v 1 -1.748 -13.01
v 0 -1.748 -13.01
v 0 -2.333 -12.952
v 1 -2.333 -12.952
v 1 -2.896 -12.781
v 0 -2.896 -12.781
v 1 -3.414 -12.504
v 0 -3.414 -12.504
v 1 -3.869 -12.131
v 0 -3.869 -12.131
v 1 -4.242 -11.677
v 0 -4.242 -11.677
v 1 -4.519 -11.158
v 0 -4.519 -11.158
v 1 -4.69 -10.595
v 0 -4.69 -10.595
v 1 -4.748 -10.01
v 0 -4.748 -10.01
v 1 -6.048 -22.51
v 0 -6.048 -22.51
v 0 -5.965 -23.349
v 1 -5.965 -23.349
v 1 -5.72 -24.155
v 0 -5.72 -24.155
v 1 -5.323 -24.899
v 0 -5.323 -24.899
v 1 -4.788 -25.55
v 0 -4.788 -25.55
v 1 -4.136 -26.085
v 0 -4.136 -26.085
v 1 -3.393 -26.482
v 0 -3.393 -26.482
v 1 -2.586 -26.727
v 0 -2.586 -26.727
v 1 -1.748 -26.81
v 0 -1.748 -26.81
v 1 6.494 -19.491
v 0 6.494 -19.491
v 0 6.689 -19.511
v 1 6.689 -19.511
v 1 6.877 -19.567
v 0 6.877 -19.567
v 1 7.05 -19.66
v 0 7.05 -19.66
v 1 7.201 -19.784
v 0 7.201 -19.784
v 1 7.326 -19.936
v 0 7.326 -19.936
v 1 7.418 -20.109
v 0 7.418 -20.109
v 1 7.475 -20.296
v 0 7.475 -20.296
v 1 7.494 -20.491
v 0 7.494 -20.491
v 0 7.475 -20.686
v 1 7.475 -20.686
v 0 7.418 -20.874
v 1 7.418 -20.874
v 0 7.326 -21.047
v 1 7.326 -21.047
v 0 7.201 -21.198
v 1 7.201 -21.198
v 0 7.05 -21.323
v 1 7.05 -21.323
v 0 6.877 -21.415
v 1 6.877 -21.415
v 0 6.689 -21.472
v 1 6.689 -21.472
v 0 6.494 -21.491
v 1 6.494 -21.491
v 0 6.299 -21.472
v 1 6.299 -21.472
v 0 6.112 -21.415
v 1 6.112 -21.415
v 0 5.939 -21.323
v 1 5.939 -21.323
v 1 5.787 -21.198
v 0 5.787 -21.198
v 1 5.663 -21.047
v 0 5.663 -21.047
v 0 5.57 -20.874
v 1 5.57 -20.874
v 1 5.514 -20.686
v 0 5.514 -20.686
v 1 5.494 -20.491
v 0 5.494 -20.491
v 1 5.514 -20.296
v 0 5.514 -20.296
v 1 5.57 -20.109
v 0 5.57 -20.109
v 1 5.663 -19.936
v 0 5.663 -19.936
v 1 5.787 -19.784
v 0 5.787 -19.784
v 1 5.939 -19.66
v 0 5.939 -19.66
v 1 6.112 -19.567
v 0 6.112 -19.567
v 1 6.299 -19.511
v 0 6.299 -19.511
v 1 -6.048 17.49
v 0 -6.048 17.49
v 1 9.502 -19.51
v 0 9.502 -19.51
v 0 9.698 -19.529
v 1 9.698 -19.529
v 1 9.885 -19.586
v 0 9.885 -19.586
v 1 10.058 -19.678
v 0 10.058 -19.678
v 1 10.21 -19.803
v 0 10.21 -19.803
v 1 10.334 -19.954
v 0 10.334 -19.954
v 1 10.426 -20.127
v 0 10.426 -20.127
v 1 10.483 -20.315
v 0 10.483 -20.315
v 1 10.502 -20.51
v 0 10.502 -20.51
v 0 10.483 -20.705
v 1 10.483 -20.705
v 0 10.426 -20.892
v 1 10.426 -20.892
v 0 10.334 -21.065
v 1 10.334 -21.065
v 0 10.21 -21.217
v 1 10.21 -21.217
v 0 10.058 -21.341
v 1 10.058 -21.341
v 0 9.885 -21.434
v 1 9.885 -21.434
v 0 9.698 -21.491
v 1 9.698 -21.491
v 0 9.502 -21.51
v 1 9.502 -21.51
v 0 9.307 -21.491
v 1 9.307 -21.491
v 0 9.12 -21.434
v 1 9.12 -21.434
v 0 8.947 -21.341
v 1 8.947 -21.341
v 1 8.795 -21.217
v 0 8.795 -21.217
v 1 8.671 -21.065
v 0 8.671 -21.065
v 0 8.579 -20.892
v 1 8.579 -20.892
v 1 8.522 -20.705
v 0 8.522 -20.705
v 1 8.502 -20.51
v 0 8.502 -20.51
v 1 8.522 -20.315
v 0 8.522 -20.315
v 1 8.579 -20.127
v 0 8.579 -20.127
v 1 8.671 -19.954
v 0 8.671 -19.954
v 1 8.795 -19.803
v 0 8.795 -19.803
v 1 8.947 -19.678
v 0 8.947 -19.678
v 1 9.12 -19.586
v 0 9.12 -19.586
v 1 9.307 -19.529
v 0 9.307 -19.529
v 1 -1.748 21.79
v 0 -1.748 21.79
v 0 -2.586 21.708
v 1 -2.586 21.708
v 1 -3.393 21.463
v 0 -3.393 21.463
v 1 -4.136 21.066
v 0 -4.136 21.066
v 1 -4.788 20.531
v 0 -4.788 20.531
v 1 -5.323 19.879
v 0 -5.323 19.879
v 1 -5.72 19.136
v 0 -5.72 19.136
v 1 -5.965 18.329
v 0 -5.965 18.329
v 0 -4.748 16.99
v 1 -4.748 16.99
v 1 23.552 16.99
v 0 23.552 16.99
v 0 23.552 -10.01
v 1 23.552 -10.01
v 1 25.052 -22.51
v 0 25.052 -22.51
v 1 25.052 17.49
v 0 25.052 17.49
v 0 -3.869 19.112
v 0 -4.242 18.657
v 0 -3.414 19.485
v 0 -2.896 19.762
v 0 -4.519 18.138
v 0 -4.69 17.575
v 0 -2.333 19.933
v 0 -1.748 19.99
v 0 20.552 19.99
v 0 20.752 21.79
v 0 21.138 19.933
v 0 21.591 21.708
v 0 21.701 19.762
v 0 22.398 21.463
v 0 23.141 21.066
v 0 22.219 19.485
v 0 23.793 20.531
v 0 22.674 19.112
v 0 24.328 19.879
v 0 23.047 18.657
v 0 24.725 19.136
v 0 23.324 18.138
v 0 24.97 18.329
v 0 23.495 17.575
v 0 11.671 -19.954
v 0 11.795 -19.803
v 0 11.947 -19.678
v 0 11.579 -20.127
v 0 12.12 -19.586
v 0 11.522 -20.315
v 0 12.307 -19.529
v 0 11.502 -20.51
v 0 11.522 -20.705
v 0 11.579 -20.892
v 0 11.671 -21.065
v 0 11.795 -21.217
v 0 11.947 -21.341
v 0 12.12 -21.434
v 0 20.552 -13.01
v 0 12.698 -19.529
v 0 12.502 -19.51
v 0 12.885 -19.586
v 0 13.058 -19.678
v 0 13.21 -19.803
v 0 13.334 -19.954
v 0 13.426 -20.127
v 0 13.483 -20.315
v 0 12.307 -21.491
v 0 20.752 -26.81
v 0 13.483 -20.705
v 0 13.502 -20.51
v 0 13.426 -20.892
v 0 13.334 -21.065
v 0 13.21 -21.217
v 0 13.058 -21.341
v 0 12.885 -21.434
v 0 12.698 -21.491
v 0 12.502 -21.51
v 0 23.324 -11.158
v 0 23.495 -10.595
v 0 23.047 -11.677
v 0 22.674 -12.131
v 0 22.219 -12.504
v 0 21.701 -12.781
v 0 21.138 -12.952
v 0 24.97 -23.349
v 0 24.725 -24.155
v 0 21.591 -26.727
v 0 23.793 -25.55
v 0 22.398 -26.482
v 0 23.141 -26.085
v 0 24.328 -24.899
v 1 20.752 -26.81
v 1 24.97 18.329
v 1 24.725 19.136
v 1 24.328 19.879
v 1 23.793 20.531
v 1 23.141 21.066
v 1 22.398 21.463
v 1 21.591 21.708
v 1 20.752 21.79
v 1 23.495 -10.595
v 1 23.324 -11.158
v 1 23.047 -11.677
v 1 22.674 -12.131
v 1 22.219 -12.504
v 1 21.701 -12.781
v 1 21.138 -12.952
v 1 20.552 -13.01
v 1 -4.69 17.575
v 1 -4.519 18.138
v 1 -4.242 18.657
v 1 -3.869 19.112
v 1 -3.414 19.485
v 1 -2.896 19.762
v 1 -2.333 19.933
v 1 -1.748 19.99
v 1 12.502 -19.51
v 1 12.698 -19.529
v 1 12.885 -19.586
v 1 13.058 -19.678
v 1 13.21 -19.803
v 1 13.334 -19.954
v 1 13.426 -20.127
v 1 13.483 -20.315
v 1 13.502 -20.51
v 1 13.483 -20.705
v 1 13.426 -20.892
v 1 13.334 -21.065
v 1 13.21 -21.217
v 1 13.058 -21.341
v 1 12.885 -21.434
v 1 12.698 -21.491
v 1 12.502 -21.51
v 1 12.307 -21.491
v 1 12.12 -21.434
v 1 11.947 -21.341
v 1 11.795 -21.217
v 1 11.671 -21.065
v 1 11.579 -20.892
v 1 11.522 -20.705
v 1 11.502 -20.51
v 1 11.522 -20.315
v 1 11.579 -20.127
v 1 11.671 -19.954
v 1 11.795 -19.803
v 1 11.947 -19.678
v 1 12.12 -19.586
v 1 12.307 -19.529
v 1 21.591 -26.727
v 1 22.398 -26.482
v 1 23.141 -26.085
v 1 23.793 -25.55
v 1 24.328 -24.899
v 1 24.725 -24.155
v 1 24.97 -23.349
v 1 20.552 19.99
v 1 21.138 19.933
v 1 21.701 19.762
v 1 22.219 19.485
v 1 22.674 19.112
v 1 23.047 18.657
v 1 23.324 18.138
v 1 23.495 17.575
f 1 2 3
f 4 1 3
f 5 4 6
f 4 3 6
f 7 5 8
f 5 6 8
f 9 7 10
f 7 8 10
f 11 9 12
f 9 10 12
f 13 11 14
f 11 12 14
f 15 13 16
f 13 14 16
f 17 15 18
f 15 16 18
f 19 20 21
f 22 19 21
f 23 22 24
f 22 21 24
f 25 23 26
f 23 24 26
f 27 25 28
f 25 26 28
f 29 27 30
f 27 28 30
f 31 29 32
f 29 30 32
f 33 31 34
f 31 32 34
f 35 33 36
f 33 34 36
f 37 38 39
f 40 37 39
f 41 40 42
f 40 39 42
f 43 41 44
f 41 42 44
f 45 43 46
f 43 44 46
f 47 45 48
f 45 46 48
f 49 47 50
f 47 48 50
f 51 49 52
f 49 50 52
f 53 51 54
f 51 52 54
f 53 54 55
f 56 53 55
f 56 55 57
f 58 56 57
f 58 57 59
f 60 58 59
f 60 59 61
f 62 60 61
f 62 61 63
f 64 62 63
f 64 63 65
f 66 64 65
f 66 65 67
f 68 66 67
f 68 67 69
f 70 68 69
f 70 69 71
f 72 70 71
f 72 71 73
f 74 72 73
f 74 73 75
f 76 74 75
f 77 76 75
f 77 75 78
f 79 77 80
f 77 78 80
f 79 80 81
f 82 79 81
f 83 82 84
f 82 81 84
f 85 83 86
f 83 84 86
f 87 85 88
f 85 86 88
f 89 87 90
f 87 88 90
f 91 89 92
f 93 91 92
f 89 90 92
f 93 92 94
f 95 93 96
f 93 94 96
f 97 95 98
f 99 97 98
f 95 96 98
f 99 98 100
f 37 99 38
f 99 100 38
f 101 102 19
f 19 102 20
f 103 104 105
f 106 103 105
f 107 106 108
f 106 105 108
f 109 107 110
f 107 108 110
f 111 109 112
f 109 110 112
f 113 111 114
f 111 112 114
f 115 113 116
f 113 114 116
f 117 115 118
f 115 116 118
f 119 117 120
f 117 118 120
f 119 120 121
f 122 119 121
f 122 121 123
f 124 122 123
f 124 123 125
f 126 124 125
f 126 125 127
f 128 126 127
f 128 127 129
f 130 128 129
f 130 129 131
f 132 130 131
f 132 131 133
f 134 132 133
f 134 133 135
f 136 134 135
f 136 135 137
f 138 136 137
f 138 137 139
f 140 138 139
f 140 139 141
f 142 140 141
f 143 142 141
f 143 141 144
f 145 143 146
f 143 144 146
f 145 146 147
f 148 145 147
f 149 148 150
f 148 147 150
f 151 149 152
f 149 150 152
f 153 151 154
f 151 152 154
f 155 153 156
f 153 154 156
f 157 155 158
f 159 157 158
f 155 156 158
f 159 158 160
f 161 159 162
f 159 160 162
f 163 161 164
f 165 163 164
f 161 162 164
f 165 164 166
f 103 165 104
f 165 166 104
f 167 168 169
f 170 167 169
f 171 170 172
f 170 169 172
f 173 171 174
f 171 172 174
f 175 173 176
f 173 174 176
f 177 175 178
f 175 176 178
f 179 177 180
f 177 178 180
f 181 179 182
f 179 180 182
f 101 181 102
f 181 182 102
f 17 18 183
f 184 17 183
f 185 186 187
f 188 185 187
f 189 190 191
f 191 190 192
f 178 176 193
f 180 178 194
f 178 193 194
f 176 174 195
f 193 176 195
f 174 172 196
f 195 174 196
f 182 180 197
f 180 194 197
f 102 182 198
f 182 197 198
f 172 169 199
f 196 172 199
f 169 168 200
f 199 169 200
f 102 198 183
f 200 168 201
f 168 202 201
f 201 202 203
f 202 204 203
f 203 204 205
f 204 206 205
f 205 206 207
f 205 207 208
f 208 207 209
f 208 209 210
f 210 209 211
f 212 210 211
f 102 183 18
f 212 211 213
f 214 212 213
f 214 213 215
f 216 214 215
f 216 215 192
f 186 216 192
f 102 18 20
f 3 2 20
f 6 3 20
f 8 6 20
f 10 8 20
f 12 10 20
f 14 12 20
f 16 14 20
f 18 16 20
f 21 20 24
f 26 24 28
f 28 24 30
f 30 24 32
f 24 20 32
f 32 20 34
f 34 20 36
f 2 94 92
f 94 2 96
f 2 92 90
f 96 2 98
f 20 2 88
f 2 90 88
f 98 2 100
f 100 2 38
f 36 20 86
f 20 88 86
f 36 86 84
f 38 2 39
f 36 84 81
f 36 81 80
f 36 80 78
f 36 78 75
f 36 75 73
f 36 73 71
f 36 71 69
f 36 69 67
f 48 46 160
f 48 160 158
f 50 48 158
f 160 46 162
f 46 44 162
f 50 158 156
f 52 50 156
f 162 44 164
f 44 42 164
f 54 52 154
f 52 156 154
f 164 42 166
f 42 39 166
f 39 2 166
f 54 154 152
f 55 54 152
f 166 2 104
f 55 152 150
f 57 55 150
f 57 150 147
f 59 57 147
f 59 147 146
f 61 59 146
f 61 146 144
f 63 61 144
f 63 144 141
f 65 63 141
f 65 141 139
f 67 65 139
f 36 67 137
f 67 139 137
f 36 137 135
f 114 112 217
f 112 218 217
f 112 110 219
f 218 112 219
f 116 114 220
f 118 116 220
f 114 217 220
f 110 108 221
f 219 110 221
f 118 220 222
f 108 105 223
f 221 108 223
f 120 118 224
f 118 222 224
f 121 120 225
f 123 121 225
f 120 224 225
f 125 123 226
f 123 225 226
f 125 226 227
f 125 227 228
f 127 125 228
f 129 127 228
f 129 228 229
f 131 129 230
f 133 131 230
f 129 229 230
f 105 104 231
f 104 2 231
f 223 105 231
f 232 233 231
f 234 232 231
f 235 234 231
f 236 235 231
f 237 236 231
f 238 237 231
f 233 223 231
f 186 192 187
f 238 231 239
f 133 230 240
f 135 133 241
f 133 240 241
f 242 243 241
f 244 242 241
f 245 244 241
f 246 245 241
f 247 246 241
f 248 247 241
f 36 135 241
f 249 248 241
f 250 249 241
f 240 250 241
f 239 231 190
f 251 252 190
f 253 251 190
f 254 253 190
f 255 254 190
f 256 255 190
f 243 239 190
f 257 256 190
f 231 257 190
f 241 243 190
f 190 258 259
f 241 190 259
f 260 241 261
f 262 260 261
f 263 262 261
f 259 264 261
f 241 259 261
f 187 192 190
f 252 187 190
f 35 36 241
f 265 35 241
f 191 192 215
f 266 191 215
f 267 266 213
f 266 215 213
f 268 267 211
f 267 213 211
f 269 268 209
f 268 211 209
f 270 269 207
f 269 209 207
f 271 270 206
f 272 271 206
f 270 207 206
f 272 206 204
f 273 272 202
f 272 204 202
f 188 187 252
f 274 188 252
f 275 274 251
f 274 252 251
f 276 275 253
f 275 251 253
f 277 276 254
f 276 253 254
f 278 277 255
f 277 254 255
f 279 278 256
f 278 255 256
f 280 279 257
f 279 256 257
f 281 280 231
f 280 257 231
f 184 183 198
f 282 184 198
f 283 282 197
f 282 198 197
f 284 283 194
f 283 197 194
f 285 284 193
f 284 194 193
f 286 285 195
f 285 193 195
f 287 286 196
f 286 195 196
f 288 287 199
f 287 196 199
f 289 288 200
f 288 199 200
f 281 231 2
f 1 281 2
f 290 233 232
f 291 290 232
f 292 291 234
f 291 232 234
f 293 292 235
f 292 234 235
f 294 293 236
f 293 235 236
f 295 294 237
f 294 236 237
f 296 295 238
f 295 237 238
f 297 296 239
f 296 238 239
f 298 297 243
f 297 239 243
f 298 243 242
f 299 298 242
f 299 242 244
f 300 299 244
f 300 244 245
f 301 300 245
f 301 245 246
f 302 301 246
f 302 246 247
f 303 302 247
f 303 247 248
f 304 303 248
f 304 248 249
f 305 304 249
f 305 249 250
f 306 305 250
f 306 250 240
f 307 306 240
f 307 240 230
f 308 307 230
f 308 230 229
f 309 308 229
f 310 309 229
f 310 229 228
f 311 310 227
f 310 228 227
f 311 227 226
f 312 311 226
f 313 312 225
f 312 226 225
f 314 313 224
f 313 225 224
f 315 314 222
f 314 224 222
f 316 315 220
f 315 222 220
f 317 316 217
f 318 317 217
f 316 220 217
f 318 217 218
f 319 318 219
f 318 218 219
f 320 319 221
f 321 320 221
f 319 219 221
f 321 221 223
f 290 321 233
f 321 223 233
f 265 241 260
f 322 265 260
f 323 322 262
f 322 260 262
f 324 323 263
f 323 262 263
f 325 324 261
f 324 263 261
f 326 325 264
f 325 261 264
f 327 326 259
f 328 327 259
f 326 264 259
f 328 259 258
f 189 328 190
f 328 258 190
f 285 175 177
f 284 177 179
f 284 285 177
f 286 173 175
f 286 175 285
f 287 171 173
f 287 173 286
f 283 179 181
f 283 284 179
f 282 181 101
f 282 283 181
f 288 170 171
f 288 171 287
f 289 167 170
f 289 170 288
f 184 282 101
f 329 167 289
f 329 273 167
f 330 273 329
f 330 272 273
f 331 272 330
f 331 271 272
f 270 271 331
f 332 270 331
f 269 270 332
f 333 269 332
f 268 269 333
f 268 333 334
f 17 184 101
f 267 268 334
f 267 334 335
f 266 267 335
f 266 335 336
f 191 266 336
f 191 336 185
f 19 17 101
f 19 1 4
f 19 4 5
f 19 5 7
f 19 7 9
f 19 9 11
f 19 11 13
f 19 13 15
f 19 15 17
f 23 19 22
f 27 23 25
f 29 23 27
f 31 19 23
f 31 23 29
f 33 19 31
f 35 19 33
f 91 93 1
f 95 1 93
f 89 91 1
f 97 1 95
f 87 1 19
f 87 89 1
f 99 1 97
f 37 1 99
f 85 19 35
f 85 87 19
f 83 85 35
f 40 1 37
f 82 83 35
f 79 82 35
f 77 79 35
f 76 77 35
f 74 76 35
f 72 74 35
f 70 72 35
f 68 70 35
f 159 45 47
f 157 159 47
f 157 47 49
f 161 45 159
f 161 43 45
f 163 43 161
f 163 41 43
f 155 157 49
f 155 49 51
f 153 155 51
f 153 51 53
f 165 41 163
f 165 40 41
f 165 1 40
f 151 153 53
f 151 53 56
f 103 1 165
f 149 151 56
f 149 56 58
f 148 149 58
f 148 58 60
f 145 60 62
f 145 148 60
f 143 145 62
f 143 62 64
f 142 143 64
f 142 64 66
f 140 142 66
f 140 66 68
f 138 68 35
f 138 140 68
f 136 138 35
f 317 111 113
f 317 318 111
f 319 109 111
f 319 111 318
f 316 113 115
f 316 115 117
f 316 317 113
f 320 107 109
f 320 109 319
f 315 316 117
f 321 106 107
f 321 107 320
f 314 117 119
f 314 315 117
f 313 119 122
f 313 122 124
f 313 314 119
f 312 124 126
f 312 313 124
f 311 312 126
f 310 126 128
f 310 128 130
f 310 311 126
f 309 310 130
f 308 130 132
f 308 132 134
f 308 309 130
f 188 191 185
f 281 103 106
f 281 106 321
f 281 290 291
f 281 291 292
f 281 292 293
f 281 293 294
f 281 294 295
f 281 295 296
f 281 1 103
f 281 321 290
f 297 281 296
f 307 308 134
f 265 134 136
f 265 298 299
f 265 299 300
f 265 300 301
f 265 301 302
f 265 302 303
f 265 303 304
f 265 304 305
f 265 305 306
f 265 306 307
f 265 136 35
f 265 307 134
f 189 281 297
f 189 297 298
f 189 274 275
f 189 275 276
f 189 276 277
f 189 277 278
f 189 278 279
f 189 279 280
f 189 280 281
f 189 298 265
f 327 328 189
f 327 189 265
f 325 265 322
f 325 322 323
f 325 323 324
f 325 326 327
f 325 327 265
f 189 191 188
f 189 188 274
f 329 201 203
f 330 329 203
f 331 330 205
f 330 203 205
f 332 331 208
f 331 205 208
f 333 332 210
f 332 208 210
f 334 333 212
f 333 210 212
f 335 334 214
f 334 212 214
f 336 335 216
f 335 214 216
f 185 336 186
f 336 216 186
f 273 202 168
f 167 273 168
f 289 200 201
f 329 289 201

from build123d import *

# Parameters (mm, degrees)
EXTRUDE_1_DEPTH     = 1
CUT_EXTRUDE_1_DEPTH = 2
SKETCH_3_R          = 1
CUT_EXTRUDE_2_DEPTH = 2


with BuildPart() as part:
    # 草图1 → 凸台-拉伸1 (new body)
    with BuildSketch(Plane(origin=(0, 0, 0), x_dir=(0, 0, -1), z_dir=(1, 0, 0))):
        with BuildLine():
            Line((26.809806157, -1.747534601), (26.809806157, 20.752465399))
            ThreePointArc((26.809806157, 20.752465399), (25.550365316, 23.793024558), (22.509806157, 25.052465399))
            Line((22.509806157, 25.052465399), (-17.490193843, 25.052465399))
            ThreePointArc((-17.490193843, 25.052465399), (-20.530753002, 23.793024558), (-21.790193843, 20.752465399))
            Line((-21.790193843, 20.752465399), (-21.790193843, -1.747534601))
            ThreePointArc((-21.790193843, -1.747534601), (-20.530753002, -4.78809376), (-17.490193843, -6.047534601))
            Line((-17.490193843, -6.047534601), (22.509806157, -6.047534601))
            ThreePointArc((22.509806157, -6.047534601), (25.550365316, -4.78809376), (26.809806157, -1.747534601))
        make_face()
    extrude(amount=EXTRUDE_1_DEPTH)

    # 草图2 → 切除-拉伸1 (cut, through all)
    with BuildSketch(Plane.ZY):
        with BuildLine():
            Line((-13.009806157, 20.552465399), (-13.009806157, -1.747534601))
            ThreePointArc((-13.009806157, -1.747534601), (-12.131126501, -3.868854944), (-10.009806157, -4.747534601))
            Line((-10.009806157, -4.747534601), (16.990193843, -4.747534601))
            ThreePointArc((16.990193843, -4.747534601), (19.111514186, -3.868854944), (19.990193843, -1.747534601))
            Line((19.990193843, -1.747534601), (19.990193843, 20.552465399))
            ThreePointArc((19.990193843, 20.552465399), (19.111514186, 22.673785743), (16.990193843, 23.552465399))
            Line((16.990193843, 23.552465399), (-10.009806157, 23.552465399))
            ThreePointArc((-10.009806157, 23.552465399), (-12.131126501, 22.673785743), (-13.009806157, 20.552465399))
        make_face()
    extrude(amount=-CUT_EXTRUDE_1_DEPTH, mode=Mode.SUBTRACT)

    # 草图3 → 切除-拉伸2 (cut, through all)
    with BuildSketch(Plane.ZY):
        with Locations((-20.491320576, 6.494332556)):
            Circle(SKETCH_3_R)
        with Locations((-20.509806157, 9.502465399)):
            Circle(SKETCH_3_R)
        with Locations((-20.509806157, 12.502465399)):
            Circle(SKETCH_3_R)
    extrude(amount=-CUT_EXTRUDE_2_DEPTH, mode=Mode.SUBTRACT)


solid = part.part
